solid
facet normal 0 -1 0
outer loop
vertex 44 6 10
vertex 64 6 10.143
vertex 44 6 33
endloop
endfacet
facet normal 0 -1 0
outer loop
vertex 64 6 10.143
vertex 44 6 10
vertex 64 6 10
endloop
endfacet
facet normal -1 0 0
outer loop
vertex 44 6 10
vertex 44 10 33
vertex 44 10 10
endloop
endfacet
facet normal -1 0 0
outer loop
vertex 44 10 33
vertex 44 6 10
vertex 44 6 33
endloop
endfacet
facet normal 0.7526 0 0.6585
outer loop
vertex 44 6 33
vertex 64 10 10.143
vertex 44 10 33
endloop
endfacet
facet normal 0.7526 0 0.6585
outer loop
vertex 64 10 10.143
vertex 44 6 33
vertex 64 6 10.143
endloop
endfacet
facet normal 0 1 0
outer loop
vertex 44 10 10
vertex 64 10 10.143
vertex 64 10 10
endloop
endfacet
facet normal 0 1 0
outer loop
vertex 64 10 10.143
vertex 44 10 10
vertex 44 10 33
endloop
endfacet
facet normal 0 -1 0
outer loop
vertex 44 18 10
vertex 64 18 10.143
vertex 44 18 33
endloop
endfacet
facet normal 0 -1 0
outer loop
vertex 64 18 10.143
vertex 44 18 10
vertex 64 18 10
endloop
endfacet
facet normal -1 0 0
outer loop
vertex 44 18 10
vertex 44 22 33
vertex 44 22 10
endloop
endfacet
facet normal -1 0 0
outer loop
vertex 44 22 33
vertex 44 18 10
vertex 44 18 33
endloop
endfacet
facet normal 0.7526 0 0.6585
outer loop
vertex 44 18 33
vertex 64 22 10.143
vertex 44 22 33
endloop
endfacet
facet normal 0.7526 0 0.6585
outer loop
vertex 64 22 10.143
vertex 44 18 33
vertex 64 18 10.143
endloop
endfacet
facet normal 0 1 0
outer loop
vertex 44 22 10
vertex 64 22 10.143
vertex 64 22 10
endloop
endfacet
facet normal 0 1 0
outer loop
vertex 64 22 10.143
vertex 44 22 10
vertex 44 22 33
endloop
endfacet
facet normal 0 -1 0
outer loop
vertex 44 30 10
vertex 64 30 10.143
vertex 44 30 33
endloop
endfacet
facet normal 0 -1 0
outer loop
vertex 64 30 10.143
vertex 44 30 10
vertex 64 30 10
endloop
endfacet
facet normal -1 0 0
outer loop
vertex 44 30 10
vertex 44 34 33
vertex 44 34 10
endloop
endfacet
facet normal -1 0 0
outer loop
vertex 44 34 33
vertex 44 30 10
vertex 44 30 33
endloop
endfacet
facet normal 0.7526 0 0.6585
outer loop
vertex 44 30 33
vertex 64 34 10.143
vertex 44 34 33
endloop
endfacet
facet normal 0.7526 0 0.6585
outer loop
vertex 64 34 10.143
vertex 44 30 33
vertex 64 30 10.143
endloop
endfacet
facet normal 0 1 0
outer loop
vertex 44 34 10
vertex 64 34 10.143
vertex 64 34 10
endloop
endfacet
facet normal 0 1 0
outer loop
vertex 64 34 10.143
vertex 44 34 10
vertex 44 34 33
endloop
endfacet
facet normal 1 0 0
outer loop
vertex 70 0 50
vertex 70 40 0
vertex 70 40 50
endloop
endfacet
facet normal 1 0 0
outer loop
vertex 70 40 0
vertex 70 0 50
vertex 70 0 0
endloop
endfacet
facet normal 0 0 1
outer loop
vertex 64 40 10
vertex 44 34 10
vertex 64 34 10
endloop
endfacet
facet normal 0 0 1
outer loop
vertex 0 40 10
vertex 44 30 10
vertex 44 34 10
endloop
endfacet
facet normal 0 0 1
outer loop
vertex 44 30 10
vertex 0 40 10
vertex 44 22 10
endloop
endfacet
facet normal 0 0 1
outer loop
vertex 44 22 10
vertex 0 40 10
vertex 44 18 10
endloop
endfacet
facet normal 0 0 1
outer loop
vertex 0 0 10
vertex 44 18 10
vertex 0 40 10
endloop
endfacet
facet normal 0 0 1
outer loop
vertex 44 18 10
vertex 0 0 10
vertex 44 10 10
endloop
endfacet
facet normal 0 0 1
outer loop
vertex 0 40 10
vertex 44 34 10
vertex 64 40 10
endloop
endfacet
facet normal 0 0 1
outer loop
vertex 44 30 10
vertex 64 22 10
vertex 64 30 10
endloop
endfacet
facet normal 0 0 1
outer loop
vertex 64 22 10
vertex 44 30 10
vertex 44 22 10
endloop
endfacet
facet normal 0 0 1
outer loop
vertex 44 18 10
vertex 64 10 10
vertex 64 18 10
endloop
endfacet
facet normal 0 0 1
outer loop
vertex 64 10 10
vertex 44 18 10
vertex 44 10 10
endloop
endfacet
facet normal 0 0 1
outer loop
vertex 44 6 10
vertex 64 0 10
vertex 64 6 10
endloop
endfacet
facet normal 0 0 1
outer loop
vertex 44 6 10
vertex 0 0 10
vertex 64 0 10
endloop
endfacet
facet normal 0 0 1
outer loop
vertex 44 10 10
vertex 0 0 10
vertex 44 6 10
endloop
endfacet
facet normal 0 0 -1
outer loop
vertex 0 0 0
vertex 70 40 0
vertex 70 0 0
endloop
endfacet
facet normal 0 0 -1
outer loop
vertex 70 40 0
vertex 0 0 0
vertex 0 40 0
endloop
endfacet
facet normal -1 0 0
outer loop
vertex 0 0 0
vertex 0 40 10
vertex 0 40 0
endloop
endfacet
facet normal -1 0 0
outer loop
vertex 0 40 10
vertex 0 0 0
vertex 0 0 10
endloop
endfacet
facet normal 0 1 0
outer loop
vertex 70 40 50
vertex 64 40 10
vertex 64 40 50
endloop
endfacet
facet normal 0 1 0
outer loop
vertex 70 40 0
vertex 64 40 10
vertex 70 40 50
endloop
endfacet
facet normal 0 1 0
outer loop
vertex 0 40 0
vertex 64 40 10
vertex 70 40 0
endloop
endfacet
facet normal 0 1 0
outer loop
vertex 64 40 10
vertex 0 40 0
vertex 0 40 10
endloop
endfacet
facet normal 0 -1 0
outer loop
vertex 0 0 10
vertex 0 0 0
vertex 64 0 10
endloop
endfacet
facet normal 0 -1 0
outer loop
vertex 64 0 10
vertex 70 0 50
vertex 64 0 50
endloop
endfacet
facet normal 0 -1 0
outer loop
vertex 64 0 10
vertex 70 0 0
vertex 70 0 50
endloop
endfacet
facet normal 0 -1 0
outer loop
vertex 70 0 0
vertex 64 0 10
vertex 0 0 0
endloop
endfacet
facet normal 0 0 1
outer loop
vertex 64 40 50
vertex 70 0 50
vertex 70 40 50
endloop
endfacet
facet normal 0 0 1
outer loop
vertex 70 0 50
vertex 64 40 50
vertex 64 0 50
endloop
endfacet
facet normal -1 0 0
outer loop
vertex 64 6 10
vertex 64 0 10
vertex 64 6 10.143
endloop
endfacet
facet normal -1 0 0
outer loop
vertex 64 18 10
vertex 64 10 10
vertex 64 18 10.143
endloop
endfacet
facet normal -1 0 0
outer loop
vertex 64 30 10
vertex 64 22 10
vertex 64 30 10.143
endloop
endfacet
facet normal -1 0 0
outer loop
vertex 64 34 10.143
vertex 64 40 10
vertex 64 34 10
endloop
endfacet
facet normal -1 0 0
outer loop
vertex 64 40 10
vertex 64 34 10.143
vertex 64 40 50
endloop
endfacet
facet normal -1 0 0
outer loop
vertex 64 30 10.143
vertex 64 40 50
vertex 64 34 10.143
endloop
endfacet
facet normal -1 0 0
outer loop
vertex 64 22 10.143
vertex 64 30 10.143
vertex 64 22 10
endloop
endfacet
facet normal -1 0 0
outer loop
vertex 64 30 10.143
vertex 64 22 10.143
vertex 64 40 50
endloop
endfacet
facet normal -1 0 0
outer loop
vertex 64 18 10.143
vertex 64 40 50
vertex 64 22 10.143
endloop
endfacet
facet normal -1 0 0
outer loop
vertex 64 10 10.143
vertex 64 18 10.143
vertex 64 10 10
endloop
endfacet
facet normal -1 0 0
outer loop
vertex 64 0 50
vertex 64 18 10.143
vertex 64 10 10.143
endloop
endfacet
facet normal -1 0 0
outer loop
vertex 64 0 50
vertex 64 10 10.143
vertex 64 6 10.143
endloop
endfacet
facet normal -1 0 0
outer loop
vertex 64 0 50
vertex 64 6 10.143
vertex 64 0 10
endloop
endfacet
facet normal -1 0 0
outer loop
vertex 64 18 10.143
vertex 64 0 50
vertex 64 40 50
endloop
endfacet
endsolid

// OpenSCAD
$fn = 32;

// ----------------------------------------------------------------------
// Rib bracket: 3-gusset L bracket
// ----------------------------------------------------------------------

// --- parameters (mm) ---
base_l = 70;              // foot length, X
base_w = 40;              // foot width, Y
base_t = 10;              // foot thickness
plate_t = 6;              // upright plate thickness
plate_h = 50;             // overall height
gus_l = 20;               // gusset leg along the foot
gus_h = 24;               // gusset height
gus_t = 4;                // gusset thickness
gus_edge = 6;             // gusset margin from the foot edge
n_gus = 3;                // gusset count

gus_pitch = (base_w - 2 * gus_edge - gus_t) / (n_gus - 1);  // gusset pitch

union() {
  cube([base_l, base_w, base_t]);
  translate([base_l - plate_t, 0, base_t - 1])
    cube([plate_t, base_w, plate_h - base_t + 1]);
  for (i = [0 : n_gus - 1])
    translate([base_l - plate_t - gus_l, gus_edge + i * gus_pitch, base_t - 1])
      rotate([-90, 0, 0])
        linear_extrude(height = gus_t)
          polygon(points = [[0, 0], [gus_l + 1, 0], [0, -gus_h]]);
}
